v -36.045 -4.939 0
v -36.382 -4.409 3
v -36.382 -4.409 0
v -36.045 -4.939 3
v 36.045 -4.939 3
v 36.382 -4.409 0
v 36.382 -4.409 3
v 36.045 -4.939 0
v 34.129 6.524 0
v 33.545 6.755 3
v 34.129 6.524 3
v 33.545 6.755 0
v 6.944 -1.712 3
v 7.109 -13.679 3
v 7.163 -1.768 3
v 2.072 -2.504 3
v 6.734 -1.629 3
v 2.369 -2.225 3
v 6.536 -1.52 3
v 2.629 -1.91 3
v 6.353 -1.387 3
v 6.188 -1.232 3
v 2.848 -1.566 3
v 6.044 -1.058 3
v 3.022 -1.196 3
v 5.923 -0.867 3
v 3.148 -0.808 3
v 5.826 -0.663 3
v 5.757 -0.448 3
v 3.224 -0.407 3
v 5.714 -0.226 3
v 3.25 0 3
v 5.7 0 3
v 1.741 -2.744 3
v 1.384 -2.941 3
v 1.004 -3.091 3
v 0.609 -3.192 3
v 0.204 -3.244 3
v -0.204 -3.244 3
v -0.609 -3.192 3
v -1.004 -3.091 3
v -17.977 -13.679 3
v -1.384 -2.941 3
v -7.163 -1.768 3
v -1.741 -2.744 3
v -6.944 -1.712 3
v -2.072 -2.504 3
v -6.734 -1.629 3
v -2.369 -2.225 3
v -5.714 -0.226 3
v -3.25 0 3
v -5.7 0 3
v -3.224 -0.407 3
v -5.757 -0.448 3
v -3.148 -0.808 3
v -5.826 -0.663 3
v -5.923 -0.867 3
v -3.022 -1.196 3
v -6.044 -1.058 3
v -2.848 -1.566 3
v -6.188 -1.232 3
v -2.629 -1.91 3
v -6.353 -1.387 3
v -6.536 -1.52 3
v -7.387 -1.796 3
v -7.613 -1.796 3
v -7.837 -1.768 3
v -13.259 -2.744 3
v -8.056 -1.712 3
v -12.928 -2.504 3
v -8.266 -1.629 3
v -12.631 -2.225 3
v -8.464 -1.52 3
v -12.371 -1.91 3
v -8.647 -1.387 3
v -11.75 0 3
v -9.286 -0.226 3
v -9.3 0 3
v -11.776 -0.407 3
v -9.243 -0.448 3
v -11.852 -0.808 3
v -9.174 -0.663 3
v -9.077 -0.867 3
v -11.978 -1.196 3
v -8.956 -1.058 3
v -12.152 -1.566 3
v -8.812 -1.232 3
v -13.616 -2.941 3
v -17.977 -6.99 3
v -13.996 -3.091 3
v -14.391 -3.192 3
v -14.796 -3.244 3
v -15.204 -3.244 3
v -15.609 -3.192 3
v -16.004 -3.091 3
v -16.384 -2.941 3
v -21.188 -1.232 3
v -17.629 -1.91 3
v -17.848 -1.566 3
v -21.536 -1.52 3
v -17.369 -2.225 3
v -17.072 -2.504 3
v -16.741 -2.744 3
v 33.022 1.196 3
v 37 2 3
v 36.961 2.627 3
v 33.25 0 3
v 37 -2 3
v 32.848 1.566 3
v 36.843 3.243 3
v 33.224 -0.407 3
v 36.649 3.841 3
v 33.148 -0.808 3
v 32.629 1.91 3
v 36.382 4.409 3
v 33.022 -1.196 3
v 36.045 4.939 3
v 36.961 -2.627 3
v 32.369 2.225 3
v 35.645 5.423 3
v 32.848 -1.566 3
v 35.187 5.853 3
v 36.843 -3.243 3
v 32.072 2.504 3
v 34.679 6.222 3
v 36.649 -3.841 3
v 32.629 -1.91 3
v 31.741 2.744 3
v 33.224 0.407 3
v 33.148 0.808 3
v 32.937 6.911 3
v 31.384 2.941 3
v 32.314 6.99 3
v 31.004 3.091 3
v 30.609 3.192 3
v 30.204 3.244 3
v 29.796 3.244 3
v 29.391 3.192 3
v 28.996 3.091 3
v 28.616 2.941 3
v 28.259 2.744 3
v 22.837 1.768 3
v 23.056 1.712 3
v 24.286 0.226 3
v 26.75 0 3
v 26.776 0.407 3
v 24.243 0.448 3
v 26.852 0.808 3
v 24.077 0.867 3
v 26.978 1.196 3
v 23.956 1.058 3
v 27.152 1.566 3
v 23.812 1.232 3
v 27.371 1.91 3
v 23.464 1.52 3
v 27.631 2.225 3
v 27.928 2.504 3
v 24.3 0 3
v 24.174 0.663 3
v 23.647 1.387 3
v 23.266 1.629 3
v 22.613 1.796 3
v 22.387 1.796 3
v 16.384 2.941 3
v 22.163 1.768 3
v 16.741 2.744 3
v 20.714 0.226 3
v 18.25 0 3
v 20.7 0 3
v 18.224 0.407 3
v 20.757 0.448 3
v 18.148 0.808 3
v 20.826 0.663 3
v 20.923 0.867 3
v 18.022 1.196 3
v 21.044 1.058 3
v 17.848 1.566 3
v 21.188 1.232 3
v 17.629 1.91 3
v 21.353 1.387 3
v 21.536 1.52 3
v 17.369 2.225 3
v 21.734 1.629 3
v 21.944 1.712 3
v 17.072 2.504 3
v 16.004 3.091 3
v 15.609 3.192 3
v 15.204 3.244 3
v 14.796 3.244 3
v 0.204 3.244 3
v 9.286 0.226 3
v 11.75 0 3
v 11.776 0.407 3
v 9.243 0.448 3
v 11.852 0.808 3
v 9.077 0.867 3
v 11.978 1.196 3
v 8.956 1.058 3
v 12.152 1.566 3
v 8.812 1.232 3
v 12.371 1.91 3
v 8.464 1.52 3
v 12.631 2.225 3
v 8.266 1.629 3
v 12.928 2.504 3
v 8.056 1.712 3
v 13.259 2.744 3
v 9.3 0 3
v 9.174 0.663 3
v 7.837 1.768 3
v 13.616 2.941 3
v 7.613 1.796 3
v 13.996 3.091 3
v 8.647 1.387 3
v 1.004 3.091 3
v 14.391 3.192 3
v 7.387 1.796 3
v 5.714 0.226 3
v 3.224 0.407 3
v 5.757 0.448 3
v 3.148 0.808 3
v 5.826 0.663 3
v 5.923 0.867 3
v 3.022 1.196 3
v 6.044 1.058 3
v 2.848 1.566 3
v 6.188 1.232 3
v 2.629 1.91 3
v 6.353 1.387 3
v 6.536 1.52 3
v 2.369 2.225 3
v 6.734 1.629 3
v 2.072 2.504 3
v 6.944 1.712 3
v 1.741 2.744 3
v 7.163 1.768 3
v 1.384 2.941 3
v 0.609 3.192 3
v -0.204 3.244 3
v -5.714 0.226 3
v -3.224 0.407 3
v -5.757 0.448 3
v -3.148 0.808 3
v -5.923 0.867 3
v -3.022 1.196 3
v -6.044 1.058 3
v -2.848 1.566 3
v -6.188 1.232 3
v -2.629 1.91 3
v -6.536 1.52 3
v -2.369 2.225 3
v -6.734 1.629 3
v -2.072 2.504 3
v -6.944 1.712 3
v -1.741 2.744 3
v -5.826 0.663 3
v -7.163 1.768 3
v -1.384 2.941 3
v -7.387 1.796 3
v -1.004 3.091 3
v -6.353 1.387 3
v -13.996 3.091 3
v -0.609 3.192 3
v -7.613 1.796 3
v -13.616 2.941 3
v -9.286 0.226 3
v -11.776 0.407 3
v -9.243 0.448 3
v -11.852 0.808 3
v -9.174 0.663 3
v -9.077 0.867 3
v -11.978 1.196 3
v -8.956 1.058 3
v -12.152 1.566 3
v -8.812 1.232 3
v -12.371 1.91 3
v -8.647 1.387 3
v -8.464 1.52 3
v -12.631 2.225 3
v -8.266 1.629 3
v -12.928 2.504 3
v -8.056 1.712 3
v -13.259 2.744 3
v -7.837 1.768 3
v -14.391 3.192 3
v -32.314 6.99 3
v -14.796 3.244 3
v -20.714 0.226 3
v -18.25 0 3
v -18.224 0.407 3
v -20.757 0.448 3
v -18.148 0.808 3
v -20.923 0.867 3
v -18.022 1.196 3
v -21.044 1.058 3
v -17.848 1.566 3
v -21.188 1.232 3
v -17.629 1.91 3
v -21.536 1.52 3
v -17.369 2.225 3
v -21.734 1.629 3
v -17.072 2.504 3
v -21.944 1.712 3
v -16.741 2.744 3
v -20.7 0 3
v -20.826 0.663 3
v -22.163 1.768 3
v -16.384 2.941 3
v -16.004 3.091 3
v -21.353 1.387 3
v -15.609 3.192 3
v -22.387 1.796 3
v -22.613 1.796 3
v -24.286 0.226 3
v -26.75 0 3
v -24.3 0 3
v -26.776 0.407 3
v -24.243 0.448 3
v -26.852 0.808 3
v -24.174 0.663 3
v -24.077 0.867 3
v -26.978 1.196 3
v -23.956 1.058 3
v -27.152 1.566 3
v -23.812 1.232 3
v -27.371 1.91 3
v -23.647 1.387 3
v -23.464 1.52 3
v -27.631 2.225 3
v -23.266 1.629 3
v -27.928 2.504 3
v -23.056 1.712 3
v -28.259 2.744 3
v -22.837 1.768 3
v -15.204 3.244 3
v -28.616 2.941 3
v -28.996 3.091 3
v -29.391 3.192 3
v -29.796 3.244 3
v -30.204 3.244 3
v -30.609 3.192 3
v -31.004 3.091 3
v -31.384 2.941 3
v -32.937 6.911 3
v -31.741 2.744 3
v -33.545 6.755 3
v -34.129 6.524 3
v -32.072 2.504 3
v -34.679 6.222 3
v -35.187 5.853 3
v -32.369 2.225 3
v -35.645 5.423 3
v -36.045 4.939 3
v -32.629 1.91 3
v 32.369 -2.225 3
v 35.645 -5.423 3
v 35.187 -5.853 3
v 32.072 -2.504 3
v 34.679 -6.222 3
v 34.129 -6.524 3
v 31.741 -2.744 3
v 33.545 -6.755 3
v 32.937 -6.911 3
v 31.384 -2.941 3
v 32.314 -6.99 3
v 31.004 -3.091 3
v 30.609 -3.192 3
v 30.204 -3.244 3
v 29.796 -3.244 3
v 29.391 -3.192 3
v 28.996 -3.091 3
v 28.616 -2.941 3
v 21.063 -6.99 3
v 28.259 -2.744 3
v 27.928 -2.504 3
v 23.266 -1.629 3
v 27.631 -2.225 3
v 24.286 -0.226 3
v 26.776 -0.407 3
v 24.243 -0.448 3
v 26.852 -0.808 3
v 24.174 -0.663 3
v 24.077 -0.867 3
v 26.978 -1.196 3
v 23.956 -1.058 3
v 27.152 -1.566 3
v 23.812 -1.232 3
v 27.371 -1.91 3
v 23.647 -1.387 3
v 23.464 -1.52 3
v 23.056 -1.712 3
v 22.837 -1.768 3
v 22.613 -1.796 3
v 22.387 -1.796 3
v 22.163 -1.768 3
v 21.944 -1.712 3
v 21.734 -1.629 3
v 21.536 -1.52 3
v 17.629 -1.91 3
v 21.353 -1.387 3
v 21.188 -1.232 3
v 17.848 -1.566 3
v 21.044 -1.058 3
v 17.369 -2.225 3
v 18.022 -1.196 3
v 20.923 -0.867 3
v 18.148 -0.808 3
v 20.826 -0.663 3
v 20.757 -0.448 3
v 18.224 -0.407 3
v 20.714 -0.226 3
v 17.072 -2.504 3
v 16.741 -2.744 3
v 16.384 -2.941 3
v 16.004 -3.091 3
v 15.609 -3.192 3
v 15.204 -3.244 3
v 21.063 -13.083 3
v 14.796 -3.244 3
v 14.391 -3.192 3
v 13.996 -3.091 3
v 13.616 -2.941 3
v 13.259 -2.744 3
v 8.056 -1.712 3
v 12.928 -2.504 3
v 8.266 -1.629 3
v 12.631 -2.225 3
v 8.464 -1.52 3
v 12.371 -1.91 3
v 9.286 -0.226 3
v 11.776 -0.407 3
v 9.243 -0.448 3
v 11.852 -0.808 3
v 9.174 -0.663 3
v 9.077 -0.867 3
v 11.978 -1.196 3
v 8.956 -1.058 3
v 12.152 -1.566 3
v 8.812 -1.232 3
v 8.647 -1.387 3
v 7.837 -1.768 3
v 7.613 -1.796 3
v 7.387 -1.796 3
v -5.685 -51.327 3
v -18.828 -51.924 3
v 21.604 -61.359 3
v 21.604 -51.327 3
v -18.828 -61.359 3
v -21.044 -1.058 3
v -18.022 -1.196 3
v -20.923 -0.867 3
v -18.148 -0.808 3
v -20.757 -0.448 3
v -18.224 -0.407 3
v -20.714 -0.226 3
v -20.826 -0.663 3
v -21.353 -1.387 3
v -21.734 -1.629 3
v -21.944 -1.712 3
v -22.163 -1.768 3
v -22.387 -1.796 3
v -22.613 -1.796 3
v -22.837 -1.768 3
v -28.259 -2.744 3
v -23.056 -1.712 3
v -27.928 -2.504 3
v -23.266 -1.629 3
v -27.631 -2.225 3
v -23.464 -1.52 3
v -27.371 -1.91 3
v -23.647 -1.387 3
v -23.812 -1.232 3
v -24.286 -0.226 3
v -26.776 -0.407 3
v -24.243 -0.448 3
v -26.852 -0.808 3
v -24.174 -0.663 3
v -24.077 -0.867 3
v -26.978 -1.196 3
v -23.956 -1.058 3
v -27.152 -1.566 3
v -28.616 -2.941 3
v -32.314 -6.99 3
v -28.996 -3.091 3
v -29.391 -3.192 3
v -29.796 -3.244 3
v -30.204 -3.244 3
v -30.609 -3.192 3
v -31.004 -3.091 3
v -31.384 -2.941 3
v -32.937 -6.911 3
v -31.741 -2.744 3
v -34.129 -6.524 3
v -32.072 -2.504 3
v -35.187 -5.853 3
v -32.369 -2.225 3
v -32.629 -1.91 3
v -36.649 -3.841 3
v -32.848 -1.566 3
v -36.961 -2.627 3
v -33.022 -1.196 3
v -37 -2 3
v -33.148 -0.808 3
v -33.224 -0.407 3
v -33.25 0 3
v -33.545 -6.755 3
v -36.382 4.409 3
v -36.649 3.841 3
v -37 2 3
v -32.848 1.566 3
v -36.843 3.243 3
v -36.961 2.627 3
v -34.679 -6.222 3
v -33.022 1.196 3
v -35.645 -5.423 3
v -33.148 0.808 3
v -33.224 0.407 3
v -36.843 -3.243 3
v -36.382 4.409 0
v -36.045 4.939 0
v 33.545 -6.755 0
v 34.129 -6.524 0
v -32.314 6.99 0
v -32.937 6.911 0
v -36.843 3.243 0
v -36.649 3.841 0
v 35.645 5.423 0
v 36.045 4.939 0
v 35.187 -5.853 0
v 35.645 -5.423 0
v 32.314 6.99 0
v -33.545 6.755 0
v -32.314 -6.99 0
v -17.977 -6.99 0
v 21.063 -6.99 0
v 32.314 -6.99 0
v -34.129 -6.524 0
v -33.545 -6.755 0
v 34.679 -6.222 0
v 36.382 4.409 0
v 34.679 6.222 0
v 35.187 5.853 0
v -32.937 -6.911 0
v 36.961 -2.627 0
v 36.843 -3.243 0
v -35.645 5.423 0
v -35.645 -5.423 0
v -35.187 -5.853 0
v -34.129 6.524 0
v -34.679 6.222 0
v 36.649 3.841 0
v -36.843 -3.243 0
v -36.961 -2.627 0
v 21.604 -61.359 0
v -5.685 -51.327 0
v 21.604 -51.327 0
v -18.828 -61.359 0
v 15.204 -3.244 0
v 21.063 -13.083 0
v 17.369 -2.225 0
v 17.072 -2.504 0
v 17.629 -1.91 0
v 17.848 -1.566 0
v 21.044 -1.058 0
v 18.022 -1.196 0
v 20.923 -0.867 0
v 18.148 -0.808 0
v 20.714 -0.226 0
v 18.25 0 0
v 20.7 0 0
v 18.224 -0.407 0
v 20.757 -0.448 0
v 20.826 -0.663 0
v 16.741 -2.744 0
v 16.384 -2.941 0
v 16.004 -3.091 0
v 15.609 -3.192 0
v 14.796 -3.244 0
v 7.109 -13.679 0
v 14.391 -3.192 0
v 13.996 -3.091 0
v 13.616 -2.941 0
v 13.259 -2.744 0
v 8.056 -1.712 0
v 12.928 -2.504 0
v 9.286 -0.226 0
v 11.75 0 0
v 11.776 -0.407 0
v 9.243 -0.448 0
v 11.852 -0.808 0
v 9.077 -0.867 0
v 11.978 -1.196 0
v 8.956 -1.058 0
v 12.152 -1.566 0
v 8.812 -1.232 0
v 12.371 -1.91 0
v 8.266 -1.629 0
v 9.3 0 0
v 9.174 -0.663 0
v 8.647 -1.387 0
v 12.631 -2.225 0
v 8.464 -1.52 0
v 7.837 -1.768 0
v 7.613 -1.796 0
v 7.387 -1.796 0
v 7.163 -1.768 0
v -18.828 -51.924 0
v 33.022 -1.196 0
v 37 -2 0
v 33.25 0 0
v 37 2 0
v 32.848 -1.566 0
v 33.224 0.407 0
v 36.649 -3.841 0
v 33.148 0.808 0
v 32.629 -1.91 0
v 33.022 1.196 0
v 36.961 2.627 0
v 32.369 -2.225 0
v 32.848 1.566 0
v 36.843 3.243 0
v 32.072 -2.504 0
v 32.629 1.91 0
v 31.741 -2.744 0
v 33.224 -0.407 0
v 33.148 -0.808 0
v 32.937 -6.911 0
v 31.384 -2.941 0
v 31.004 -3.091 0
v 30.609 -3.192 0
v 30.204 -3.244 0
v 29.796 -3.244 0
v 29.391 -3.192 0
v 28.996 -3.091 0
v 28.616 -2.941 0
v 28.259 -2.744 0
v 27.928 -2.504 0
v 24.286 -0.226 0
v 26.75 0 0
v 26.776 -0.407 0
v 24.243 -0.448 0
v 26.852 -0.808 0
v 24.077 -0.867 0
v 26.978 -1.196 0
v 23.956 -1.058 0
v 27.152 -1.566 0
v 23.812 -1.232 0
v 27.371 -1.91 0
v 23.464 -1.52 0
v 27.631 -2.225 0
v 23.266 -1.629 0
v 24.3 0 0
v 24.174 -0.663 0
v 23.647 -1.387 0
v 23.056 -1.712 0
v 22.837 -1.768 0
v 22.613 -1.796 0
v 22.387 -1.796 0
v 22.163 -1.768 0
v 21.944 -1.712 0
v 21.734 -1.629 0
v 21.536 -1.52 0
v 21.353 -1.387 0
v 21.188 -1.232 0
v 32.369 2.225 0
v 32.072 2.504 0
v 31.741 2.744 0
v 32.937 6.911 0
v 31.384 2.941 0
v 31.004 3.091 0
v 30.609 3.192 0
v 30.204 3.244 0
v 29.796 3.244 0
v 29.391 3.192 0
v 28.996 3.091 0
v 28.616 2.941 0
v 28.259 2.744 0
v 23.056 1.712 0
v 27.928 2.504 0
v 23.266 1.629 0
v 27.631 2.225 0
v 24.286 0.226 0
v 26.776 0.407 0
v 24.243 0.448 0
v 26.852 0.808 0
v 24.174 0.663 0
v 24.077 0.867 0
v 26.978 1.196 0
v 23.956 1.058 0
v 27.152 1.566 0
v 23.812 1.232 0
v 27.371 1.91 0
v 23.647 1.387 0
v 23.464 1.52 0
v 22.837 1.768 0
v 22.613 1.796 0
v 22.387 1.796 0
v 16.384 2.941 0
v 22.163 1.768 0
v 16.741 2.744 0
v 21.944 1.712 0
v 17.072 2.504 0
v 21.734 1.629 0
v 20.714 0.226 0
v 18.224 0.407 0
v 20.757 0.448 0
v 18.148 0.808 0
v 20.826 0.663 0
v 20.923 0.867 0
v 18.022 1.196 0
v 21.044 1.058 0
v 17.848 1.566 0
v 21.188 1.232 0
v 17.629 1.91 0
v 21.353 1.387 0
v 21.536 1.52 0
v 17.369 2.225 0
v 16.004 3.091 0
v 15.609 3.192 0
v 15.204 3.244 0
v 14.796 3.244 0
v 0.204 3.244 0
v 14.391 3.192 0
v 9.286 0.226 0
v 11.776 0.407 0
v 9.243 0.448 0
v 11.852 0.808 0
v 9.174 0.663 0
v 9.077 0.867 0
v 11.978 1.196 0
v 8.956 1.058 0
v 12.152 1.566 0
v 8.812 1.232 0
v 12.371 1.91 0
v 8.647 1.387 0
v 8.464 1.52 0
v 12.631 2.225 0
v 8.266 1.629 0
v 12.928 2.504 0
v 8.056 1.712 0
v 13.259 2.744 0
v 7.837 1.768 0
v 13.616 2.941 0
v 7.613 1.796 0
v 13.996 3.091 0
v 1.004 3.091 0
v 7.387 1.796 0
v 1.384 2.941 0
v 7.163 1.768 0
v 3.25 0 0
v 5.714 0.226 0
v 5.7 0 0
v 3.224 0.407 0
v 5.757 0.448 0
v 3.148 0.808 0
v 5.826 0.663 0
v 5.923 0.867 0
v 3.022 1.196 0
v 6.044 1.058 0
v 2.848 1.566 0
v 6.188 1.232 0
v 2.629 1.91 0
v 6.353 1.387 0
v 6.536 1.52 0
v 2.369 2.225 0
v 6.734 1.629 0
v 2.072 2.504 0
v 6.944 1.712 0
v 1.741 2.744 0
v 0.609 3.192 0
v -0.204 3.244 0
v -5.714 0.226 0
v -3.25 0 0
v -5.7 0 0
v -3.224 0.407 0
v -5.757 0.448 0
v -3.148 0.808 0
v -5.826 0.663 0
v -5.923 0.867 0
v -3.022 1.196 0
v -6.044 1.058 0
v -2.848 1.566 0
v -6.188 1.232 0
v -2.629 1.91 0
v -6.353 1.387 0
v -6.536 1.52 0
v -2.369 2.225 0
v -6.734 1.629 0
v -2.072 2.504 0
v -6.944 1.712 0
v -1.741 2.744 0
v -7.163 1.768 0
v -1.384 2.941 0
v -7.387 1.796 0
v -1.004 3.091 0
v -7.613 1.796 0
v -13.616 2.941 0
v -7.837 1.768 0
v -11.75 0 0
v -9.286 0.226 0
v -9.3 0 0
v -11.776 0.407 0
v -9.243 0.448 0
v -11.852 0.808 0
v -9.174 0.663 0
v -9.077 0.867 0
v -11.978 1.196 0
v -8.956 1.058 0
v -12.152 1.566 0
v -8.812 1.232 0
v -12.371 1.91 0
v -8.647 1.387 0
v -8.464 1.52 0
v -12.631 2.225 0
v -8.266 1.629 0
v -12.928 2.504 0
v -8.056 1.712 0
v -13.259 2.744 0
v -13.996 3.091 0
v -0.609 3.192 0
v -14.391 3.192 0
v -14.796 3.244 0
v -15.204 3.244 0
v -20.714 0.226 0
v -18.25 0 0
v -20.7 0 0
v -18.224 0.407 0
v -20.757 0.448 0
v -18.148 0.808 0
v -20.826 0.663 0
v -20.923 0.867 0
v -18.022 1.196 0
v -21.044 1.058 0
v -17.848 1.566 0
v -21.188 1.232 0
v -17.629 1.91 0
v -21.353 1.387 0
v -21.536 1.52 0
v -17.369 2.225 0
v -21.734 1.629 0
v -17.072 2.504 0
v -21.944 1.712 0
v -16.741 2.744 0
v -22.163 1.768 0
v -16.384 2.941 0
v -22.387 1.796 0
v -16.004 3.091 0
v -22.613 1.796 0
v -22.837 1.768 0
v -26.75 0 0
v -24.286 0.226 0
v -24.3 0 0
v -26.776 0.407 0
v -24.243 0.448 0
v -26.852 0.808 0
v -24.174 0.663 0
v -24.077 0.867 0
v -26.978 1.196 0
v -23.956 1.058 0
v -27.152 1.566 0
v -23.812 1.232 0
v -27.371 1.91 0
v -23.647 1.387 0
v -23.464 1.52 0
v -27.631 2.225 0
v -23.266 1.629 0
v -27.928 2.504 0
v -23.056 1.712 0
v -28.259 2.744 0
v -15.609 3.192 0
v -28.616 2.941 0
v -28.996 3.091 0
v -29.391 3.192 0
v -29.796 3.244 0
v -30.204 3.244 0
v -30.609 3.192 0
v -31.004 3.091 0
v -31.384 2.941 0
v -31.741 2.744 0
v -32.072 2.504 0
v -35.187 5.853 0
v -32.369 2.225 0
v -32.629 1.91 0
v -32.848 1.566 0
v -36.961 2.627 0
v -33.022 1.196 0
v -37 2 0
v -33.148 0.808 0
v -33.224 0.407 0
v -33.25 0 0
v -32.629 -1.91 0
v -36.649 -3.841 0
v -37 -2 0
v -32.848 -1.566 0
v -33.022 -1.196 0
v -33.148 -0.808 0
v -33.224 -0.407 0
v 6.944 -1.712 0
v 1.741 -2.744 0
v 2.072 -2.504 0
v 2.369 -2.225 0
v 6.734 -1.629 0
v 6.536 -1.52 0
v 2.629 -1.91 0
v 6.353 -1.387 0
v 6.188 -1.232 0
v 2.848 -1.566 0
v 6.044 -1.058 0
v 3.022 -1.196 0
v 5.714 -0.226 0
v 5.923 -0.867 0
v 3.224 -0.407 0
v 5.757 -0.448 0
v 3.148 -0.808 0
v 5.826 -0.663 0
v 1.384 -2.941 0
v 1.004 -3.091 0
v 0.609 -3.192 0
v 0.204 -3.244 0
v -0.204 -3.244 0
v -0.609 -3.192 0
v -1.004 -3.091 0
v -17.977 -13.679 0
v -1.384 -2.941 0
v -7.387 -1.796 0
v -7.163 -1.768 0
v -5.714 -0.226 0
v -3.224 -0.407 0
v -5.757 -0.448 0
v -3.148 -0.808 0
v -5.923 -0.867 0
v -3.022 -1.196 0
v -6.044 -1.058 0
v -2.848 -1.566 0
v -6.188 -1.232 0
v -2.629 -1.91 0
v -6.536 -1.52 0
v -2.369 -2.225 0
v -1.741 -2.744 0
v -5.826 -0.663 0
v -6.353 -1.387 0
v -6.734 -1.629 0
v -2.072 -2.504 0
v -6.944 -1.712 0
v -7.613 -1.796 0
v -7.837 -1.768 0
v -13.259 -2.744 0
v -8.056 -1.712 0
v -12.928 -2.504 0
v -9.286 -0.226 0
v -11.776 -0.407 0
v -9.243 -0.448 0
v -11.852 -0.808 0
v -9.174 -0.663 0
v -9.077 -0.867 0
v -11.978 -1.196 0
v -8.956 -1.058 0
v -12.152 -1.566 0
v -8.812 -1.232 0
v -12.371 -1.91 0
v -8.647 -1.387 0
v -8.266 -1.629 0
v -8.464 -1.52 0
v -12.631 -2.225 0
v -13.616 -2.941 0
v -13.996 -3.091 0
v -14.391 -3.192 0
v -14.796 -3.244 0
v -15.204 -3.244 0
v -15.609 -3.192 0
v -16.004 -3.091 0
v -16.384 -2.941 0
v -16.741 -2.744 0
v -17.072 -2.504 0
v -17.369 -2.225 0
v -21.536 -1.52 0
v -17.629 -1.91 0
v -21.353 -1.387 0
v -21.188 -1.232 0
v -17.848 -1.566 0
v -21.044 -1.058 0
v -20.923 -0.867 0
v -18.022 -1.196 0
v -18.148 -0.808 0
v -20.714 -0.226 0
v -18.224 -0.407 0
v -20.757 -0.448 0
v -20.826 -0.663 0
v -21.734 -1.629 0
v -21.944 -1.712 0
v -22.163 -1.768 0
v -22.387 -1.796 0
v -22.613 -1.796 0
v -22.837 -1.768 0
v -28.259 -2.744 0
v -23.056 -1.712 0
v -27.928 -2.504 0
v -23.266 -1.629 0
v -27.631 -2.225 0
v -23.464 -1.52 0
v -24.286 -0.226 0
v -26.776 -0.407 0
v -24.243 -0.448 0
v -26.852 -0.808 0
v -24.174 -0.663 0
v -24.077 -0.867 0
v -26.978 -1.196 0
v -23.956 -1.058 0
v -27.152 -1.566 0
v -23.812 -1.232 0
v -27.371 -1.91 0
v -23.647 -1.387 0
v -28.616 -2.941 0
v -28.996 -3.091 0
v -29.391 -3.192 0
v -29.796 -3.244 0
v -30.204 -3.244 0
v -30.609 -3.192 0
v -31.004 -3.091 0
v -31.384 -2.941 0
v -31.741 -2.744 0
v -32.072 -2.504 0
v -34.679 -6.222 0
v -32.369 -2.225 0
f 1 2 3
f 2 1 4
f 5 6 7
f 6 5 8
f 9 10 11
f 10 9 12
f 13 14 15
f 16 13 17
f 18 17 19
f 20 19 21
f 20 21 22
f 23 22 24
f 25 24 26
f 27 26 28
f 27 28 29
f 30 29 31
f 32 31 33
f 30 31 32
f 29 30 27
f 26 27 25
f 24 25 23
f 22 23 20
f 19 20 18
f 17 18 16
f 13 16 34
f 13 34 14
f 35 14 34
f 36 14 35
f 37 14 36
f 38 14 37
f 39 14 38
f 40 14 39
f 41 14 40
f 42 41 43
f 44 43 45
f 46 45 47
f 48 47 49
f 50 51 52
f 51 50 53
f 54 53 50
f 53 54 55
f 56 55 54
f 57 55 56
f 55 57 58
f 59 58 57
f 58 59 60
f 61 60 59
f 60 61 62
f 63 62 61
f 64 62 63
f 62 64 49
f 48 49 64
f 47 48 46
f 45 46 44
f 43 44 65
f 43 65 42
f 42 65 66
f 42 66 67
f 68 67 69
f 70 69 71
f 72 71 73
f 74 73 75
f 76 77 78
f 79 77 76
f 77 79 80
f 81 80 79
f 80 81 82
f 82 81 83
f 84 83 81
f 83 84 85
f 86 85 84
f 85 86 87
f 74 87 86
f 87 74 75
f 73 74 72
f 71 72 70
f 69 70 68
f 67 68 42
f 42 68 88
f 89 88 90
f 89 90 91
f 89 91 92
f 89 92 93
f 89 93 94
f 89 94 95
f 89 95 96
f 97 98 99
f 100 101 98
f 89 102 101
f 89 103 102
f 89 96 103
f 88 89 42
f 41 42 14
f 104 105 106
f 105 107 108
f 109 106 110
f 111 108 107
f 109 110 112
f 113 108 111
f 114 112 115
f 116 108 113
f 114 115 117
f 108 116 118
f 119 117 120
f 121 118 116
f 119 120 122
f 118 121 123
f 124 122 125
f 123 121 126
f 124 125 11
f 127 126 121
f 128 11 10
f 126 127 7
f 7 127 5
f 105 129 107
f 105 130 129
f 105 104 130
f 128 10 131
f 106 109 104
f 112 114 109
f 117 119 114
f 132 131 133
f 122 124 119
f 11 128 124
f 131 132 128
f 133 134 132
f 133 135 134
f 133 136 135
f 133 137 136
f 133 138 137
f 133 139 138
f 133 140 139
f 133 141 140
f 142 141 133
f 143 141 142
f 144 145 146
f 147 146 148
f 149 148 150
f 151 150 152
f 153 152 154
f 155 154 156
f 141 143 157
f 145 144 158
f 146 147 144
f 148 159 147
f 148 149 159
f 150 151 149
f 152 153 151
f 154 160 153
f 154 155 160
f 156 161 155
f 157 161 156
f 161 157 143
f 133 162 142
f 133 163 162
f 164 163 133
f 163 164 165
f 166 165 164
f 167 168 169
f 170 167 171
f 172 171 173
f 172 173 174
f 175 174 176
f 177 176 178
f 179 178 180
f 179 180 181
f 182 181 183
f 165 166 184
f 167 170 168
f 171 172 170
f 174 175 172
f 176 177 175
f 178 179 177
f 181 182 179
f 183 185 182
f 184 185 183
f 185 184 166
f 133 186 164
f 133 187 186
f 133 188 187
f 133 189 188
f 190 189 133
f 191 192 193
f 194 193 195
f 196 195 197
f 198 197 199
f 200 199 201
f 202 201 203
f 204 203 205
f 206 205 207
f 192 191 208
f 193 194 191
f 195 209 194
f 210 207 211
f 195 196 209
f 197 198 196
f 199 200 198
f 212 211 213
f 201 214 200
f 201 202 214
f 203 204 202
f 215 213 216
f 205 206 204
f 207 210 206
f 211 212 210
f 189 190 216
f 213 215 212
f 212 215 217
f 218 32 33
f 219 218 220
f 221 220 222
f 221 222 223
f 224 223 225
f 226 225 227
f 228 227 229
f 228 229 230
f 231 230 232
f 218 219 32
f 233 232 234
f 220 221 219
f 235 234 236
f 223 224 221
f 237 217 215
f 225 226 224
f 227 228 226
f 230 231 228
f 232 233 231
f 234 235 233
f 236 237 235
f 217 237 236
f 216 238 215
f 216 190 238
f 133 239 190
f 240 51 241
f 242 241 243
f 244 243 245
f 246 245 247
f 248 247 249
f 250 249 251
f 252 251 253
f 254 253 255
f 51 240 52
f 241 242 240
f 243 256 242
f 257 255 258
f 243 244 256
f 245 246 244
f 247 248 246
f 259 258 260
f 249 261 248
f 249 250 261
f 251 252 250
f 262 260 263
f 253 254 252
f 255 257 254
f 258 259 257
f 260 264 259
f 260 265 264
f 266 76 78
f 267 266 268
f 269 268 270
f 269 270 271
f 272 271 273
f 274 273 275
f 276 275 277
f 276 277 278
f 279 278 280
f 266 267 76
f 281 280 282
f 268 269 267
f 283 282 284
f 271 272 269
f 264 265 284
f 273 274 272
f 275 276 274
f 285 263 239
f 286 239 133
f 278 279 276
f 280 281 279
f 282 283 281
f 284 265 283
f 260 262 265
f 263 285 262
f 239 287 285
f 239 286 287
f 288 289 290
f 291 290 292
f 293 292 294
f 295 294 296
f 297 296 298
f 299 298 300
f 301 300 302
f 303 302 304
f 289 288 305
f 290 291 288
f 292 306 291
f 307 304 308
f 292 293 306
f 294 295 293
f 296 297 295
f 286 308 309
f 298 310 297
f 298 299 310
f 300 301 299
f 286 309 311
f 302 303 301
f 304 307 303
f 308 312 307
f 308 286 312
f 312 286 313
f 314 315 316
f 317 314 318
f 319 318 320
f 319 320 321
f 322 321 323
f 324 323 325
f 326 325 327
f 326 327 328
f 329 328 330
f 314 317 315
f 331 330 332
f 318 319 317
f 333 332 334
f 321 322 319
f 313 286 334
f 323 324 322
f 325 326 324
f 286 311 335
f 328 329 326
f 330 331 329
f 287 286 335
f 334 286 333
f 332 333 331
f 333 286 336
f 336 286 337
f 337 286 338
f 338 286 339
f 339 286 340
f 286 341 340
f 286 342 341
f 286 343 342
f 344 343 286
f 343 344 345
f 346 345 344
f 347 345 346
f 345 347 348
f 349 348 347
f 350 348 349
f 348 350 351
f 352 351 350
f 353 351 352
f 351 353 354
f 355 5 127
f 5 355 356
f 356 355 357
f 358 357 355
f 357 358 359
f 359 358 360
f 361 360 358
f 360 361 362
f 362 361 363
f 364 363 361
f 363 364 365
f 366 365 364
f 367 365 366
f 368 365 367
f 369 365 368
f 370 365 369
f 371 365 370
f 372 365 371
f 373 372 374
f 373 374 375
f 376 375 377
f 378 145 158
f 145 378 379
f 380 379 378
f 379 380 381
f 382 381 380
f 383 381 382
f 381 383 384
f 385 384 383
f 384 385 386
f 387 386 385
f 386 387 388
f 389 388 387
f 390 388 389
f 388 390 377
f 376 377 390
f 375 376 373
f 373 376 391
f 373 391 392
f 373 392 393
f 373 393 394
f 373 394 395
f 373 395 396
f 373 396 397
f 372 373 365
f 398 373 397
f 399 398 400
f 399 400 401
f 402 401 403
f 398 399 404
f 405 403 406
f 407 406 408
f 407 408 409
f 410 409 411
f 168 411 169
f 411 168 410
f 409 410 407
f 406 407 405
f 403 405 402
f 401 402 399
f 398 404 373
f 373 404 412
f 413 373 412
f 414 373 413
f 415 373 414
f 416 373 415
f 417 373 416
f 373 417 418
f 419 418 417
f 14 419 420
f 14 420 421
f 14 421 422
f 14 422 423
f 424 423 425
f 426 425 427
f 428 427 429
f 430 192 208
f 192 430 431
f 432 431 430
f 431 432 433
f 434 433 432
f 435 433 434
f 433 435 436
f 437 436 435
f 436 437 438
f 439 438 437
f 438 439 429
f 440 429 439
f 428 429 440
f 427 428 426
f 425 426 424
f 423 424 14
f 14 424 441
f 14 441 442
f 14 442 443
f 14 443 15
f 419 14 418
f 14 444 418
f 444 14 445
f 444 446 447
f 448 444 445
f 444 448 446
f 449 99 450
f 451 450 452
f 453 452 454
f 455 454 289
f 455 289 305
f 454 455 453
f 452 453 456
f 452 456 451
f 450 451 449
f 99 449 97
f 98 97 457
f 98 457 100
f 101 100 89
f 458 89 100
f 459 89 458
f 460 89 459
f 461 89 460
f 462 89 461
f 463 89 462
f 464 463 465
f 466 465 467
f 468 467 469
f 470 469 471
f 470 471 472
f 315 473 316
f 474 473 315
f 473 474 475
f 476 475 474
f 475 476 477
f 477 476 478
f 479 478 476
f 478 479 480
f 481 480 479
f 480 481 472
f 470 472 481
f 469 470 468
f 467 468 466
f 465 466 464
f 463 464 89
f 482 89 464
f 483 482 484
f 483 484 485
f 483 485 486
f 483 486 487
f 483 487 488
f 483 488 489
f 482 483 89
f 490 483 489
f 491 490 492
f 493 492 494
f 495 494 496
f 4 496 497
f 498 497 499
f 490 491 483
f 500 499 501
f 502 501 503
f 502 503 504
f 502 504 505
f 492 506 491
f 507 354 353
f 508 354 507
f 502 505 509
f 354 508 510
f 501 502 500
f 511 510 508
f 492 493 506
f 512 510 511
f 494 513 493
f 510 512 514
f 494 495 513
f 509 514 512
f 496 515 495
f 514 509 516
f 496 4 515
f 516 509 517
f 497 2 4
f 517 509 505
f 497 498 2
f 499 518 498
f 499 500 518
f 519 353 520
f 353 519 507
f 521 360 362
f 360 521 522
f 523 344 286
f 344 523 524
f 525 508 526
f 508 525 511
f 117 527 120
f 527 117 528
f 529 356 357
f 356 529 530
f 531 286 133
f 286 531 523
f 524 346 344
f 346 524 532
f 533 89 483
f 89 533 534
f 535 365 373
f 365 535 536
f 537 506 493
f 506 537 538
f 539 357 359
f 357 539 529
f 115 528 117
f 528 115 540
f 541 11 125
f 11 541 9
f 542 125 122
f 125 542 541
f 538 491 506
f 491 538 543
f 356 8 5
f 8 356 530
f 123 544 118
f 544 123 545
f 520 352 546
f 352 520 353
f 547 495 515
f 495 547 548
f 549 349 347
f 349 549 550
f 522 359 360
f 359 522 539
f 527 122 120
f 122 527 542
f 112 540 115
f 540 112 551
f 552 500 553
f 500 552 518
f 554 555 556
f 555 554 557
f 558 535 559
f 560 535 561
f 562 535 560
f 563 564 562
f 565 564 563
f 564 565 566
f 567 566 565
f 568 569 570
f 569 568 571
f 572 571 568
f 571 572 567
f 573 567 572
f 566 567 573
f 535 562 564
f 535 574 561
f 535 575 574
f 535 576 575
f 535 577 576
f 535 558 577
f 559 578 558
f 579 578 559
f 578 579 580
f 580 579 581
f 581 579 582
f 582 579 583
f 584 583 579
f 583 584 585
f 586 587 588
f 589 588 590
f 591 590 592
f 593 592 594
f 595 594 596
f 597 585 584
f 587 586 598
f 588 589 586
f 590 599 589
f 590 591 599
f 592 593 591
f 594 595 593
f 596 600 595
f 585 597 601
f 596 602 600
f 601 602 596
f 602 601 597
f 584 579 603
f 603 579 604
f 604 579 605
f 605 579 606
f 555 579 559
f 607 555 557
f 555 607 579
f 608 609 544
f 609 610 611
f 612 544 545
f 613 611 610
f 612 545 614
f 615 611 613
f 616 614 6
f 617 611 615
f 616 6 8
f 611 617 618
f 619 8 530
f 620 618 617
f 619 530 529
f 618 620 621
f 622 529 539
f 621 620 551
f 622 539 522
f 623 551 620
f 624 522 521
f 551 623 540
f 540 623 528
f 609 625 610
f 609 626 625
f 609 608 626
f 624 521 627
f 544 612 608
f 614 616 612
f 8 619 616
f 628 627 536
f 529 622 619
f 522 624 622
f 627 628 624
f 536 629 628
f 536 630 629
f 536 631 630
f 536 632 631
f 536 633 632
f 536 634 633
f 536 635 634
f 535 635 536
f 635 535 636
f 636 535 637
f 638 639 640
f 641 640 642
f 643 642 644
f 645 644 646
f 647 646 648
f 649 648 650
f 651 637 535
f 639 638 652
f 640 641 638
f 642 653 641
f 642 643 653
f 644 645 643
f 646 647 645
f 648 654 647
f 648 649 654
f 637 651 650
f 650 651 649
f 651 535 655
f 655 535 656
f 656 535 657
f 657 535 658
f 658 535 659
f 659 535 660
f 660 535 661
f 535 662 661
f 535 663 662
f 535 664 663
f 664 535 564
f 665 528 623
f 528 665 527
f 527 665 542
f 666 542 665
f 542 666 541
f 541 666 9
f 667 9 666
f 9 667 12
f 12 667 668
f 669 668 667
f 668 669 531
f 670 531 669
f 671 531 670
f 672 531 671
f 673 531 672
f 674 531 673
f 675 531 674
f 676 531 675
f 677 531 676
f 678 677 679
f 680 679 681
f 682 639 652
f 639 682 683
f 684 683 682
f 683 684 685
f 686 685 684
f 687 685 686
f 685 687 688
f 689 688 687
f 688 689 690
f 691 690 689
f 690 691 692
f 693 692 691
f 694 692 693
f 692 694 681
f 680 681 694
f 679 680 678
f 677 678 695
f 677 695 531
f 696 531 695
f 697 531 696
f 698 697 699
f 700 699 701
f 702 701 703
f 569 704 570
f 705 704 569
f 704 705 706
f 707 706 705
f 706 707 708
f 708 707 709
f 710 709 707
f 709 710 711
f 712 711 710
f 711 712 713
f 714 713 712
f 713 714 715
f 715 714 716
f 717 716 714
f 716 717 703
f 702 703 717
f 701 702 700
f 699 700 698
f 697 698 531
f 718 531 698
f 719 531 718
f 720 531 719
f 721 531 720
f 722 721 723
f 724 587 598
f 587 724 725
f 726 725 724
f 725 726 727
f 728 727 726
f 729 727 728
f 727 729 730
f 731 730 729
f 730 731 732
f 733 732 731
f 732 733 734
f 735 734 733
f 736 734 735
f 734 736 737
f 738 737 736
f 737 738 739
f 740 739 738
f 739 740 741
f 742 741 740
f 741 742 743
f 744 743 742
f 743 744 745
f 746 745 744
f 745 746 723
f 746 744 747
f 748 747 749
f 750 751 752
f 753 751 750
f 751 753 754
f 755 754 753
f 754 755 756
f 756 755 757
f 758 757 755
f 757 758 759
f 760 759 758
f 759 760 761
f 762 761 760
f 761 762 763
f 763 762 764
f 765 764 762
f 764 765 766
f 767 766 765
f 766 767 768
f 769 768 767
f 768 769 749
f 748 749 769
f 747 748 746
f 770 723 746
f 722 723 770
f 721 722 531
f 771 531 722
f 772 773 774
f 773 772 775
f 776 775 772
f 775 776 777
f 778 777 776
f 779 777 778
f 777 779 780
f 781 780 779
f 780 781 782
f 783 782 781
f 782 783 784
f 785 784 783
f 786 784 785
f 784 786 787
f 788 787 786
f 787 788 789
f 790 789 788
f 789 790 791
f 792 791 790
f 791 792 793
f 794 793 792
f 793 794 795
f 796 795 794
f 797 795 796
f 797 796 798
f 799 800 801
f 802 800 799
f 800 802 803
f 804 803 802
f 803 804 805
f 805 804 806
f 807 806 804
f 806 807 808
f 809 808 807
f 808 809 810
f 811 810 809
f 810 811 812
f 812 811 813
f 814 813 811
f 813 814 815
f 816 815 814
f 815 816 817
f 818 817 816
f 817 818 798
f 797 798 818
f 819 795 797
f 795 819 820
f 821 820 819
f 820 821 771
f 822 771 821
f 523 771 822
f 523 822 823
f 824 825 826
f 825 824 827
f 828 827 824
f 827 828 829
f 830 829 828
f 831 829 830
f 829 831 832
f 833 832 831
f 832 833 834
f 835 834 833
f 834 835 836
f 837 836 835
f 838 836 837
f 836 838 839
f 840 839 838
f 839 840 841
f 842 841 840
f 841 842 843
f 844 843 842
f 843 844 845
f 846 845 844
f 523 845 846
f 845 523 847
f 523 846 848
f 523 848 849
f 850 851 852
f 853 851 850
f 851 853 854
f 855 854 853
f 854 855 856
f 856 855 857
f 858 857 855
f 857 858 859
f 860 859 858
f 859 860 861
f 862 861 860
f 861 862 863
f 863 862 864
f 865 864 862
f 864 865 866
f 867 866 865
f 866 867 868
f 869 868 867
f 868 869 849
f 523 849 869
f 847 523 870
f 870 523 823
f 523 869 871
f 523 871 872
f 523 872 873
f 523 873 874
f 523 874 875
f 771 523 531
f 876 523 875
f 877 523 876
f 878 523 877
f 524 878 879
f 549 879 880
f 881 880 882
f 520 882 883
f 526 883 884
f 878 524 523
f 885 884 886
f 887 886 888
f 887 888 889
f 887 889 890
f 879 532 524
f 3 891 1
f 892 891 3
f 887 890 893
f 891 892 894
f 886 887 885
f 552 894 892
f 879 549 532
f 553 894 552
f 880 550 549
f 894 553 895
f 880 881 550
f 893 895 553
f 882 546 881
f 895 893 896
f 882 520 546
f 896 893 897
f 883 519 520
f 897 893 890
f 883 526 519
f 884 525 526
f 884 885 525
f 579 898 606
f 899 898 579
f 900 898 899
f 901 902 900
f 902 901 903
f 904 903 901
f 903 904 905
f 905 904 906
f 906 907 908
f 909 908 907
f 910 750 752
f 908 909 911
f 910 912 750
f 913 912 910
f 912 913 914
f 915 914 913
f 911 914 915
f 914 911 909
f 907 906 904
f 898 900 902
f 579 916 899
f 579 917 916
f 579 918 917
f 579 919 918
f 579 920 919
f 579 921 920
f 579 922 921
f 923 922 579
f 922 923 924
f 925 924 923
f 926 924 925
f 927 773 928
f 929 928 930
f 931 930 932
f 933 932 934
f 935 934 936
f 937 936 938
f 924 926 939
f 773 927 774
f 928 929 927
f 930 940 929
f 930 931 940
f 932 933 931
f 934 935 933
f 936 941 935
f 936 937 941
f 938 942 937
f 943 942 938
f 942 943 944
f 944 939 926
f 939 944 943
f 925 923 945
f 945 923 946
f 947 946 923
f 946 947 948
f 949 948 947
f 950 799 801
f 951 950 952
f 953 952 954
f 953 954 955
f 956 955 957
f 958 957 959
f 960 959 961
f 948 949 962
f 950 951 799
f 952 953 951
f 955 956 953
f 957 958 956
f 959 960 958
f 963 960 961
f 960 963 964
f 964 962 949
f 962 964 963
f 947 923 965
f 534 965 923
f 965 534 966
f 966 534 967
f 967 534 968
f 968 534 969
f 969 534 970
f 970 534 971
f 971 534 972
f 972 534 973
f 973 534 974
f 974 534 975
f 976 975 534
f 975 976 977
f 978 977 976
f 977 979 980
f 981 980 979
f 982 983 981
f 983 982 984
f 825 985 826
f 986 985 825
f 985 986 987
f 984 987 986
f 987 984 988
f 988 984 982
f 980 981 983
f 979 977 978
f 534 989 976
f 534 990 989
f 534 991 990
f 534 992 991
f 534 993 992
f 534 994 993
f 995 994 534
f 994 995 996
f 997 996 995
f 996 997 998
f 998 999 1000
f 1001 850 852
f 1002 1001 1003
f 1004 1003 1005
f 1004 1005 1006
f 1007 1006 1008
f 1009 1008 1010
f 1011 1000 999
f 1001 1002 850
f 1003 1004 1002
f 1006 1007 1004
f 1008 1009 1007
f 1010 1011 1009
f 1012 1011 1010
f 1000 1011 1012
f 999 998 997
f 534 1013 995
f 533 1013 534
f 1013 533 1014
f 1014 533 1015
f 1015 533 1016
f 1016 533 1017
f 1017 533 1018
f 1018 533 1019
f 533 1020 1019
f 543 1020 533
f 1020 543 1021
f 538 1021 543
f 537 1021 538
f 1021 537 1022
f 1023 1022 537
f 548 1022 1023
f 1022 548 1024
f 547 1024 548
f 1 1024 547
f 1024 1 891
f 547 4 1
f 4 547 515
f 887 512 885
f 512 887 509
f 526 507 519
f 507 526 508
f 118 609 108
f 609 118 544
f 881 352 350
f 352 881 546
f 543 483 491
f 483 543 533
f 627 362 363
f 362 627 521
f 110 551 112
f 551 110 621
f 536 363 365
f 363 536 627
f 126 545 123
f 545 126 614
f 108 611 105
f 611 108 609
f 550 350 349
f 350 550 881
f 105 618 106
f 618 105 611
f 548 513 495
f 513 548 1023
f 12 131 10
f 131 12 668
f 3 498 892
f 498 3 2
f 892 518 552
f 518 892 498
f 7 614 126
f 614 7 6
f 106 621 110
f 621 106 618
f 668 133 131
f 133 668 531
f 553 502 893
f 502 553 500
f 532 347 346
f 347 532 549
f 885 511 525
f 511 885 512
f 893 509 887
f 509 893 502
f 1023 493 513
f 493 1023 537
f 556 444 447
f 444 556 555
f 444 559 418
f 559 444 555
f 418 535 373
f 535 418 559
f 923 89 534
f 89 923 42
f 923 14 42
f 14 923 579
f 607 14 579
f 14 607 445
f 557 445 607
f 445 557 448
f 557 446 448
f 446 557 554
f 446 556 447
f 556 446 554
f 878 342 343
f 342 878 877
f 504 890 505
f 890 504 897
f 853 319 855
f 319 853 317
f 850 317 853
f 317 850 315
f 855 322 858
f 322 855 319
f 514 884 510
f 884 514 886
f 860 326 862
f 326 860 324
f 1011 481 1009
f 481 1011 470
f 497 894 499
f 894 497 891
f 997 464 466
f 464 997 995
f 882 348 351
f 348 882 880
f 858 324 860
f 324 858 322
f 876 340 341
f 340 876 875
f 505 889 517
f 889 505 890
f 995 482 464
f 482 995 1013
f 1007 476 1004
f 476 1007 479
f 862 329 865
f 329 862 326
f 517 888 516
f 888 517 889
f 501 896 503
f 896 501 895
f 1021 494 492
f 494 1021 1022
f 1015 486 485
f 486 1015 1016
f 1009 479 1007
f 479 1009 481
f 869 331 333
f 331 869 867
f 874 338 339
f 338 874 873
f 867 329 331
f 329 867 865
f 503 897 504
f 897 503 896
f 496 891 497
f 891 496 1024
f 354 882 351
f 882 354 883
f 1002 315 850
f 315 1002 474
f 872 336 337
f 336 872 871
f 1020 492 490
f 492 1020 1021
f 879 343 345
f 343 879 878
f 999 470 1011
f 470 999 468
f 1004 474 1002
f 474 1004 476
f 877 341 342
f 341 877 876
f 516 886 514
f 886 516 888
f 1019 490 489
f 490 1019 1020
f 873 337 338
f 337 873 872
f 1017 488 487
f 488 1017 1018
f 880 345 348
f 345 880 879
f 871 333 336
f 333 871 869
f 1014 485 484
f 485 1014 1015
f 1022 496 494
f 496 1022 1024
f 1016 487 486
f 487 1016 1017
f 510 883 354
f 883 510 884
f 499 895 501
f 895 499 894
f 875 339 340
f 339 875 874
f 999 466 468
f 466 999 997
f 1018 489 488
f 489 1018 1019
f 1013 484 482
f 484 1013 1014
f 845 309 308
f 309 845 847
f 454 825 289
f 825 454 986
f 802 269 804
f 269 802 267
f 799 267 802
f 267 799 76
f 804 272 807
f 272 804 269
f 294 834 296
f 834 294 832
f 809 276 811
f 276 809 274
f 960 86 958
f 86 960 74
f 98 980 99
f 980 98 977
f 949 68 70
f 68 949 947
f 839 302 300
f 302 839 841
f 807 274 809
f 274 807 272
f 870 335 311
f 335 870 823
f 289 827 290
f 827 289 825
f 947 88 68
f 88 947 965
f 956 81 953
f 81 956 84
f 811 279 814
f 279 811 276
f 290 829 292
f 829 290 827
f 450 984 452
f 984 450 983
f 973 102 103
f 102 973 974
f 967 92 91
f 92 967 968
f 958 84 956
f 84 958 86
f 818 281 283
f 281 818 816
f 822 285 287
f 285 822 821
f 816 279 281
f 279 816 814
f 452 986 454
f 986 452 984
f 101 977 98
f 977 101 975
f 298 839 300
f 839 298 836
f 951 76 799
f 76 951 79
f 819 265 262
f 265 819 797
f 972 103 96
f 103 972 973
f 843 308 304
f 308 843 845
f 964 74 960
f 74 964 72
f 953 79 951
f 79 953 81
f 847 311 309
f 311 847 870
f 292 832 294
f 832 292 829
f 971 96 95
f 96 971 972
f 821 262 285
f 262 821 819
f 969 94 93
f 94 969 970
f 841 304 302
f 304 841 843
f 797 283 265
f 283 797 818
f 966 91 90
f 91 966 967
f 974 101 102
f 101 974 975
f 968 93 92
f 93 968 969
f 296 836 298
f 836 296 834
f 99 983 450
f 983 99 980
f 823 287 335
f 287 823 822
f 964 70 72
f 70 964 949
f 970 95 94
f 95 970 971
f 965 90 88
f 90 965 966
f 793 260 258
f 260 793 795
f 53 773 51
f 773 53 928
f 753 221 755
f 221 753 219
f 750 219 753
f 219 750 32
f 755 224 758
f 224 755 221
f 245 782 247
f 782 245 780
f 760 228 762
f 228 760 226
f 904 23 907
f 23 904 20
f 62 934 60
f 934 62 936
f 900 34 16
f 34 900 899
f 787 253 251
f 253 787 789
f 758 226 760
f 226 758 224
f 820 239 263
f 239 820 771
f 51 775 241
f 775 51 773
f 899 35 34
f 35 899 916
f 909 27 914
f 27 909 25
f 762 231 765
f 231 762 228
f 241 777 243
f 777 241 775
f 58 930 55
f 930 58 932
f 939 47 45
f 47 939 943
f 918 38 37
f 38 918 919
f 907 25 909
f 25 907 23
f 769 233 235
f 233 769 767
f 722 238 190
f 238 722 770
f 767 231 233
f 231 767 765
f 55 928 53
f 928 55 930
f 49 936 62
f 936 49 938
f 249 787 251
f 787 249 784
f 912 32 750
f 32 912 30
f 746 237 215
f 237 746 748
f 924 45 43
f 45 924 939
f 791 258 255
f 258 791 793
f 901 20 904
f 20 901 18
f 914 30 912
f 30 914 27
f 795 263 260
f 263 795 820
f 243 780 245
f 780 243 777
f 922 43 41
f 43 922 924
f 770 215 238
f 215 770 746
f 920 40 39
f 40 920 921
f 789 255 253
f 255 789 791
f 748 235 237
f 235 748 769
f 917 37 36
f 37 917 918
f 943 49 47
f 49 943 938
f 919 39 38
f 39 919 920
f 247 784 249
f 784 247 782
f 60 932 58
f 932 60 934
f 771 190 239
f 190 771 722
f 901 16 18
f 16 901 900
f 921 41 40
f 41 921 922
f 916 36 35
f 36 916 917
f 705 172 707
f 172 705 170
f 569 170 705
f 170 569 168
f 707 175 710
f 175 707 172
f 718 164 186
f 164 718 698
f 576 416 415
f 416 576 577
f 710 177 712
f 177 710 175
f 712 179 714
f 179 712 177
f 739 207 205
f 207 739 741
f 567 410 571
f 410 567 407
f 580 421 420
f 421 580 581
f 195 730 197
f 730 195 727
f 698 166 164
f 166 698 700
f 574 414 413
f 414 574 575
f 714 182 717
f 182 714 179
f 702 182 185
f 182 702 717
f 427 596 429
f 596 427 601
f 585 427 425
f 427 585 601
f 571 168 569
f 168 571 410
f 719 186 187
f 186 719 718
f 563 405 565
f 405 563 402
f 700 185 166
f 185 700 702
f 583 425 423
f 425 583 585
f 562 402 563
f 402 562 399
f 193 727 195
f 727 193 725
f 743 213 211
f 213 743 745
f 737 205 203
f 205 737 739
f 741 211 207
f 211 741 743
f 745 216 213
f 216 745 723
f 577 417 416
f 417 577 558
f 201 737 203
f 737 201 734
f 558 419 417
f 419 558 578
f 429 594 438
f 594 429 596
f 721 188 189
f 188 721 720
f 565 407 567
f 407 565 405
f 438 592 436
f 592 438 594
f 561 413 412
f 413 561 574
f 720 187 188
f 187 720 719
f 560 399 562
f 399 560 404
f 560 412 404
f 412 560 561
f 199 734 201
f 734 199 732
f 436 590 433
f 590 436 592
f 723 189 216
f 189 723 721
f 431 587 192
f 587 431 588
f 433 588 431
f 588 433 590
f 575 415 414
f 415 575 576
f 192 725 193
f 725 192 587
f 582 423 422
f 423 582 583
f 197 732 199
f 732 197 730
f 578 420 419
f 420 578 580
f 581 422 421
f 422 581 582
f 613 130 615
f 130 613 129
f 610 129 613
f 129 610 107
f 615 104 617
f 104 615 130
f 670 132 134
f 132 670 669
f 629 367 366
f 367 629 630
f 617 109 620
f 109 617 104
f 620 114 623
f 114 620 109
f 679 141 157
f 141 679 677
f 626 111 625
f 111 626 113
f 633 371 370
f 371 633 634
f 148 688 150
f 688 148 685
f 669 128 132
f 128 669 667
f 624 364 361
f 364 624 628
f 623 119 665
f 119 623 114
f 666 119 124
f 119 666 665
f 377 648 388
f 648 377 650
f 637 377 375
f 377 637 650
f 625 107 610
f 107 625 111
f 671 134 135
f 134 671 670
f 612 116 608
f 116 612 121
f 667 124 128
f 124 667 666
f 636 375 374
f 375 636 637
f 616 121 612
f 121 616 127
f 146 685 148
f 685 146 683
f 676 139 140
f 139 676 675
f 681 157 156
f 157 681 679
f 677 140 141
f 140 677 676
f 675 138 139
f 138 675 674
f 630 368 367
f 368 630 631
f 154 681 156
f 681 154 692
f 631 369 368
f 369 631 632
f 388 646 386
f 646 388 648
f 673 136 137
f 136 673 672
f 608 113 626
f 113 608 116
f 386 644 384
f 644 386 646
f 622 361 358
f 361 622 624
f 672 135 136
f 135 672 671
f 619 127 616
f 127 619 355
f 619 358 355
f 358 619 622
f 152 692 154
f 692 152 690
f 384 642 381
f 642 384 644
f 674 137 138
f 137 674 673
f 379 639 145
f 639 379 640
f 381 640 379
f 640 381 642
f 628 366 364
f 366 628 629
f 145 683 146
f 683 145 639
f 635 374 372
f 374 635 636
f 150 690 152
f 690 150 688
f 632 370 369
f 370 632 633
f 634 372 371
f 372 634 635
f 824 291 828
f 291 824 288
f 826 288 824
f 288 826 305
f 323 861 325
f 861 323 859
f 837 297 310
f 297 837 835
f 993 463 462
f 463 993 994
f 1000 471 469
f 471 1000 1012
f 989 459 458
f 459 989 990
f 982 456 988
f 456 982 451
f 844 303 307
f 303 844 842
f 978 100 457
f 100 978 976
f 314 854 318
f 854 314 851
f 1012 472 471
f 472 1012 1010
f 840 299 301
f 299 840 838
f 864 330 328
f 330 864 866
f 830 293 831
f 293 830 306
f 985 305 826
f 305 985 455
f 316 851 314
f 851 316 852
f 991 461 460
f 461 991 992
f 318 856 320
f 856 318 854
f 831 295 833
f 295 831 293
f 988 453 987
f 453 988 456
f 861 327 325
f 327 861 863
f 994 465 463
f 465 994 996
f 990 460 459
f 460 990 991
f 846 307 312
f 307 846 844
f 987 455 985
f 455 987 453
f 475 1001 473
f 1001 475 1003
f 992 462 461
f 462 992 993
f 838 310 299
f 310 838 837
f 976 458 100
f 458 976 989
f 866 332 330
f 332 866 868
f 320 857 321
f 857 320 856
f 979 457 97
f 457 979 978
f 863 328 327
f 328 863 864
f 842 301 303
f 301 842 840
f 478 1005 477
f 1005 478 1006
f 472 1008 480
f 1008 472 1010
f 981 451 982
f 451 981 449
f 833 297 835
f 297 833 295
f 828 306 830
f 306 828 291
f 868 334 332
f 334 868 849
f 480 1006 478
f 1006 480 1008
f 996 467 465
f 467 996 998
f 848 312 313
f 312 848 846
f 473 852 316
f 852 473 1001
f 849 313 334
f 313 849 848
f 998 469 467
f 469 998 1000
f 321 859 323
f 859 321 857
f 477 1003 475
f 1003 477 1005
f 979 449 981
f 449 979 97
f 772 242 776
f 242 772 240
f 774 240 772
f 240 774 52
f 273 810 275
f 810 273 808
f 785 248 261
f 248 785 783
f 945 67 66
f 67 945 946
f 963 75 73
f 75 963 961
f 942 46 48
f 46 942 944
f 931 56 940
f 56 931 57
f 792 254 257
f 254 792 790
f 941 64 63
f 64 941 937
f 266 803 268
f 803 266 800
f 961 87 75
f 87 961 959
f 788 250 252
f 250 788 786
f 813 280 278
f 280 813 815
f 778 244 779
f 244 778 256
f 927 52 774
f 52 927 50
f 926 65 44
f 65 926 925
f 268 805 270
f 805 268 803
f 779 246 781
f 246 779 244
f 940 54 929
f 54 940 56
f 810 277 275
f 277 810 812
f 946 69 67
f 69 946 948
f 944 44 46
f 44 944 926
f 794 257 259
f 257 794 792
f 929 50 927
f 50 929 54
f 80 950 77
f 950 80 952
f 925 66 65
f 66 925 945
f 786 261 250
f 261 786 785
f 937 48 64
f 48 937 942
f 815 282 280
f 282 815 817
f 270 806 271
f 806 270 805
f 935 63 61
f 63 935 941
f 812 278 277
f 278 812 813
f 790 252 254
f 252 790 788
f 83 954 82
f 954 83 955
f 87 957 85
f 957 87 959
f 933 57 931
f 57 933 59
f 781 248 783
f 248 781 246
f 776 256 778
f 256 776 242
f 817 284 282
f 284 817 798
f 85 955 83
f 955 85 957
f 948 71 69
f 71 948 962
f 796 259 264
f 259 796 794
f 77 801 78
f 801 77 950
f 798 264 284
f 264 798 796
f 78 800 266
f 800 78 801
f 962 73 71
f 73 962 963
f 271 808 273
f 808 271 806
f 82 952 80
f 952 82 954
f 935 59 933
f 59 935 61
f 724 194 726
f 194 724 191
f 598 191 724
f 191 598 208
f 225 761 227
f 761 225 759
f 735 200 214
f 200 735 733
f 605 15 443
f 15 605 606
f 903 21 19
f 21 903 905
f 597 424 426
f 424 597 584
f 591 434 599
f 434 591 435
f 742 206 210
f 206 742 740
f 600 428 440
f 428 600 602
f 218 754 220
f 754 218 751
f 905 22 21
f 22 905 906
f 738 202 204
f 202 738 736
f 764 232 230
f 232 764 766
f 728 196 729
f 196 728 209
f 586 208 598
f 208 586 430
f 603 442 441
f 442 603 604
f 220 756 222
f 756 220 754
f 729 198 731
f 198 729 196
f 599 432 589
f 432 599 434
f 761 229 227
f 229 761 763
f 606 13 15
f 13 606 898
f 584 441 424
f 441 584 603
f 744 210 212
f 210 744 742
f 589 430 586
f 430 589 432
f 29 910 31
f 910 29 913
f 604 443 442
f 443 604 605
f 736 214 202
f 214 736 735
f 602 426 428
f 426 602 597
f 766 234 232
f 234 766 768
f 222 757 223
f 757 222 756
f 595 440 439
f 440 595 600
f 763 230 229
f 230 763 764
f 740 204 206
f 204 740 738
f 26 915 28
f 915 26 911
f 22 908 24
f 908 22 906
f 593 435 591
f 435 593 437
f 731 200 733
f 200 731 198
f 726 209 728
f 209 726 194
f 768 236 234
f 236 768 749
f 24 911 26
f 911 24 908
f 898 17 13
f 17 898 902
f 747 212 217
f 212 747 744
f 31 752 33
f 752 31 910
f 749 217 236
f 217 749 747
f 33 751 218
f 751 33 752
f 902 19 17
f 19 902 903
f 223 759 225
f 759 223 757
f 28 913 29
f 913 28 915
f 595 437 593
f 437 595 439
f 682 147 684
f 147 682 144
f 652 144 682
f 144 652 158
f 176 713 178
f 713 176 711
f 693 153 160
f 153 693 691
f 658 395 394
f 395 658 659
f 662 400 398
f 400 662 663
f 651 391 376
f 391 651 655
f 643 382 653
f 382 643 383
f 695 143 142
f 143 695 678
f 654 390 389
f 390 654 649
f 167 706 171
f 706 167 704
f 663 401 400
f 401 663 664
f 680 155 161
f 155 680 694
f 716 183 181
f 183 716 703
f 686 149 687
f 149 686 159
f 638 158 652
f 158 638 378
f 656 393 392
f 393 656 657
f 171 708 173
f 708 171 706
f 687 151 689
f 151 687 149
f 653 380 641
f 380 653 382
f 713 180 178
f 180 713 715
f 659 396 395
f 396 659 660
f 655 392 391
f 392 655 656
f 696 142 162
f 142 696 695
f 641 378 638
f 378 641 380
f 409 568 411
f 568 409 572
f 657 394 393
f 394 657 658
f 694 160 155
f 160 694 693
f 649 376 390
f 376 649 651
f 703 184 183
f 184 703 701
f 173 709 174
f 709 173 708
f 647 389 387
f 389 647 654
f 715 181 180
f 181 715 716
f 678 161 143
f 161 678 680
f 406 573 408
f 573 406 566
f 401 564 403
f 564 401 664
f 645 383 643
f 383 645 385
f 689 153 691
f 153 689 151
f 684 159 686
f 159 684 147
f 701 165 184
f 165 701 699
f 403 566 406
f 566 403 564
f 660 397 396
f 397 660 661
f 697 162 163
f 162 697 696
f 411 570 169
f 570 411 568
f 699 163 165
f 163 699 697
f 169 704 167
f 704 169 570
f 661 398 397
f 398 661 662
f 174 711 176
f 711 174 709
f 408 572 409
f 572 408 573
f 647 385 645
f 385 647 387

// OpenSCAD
$fn = 50;


difference() {
	union() {
		hull() {
			translate(v = [-32.0000000000, 2.0000000000, 0]) {
				cylinder(h = 3, r = 5);
			}
			translate(v = [32.0000000000, 2.0000000000, 0]) {
				cylinder(h = 3, r = 5);
			}
			translate(v = [-32.0000000000, -2.0000000000, 0]) {
				cylinder(h = 3, r = 5);
			}
			translate(v = [32.0000000000, -2.0000000000, 0]) {
				cylinder(h = 3, r = 5);
			}
		}
		translate(v = [0, -5, 0]) {
			linear_extrude(height = 3) {
				text(font = "DejaVu Sans Mono:style=Bold", halign = "center", size = 57.0000000000, text = "Z", valign = "top");
			}
		}
	}
	union() {
		translate(v = [-30.0000000000, 0.0000000000, 0]) {
			translate(v = [0, 0, -100]) {
				cylinder(h = 200, r = 3.2500000000);
			}
		}
		translate(v = [-15.0000000000, 0.0000000000, 0]) {
			translate(v = [0, 0, -100]) {
				cylinder(h = 200, r = 3.2500000000);
			}
		}
		translate(v = [0, 0, -100]) {
			cylinder(h = 200, r = 3.2500000000);
		}
		translate(v = [15.0000000000, 0.0000000000, 0]) {
			translate(v = [0, 0, -100]) {
				cylinder(h = 200, r = 3.2500000000);
			}
		}
		translate(v = [30.0000000000, 0.0000000000, 0]) {
			translate(v = [0, 0, -100]) {
				cylinder(h = 200, r = 3.2500000000);
			}
		}
		translate(v = [-30.0000000000, 0.0000000000, 0]) {
			translate(v = [0, 0, -100]) {
				cylinder(h = 200, r = 1.8000000000);
			}
		}
		translate(v = [-22.5000000000, 0.0000000000, 0]) {
			translate(v = [0, 0, -100]) {
				cylinder(h = 200, r = 1.8000000000);
			}
		}
		translate(v = [-15.0000000000, 0.0000000000, 0]) {
			translate(v = [0, 0, -100]) {
				cylinder(h = 200, r = 1.8000000000);
			}
		}
		translate(v = [-7.5000000000, 0.0000000000, 0]) {
			translate(v = [0, 0, -100]) {
				cylinder(h = 200, r = 1.8000000000);
			}
		}
		translate(v = [0, 0, -100]) {
			cylinder(h = 200, r = 1.8000000000);
		}
		translate(v = [7.5000000000, 0.0000000000, 0]) {
			translate(v = [0, 0, -100]) {
				cylinder(h = 200, r = 1.8000000000);
			}
		}
		translate(v = [15.0000000000, 0.0000000000, 0]) {
			translate(v = [0, 0, -100]) {
				cylinder(h = 200, r = 1.8000000000);
			}
		}
		translate(v = [22.5000000000, 0.0000000000, 0]) {
			translate(v = [0, 0, -100]) {
				cylinder(h = 200, r = 1.8000000000);
			}
		}
		translate(v = [30.0000000000, 0.0000000000, 0]) {
			translate(v = [0, 0, -100]) {
				cylinder(h = 200, r = 1.8000000000);
			}
		}
	}
}
